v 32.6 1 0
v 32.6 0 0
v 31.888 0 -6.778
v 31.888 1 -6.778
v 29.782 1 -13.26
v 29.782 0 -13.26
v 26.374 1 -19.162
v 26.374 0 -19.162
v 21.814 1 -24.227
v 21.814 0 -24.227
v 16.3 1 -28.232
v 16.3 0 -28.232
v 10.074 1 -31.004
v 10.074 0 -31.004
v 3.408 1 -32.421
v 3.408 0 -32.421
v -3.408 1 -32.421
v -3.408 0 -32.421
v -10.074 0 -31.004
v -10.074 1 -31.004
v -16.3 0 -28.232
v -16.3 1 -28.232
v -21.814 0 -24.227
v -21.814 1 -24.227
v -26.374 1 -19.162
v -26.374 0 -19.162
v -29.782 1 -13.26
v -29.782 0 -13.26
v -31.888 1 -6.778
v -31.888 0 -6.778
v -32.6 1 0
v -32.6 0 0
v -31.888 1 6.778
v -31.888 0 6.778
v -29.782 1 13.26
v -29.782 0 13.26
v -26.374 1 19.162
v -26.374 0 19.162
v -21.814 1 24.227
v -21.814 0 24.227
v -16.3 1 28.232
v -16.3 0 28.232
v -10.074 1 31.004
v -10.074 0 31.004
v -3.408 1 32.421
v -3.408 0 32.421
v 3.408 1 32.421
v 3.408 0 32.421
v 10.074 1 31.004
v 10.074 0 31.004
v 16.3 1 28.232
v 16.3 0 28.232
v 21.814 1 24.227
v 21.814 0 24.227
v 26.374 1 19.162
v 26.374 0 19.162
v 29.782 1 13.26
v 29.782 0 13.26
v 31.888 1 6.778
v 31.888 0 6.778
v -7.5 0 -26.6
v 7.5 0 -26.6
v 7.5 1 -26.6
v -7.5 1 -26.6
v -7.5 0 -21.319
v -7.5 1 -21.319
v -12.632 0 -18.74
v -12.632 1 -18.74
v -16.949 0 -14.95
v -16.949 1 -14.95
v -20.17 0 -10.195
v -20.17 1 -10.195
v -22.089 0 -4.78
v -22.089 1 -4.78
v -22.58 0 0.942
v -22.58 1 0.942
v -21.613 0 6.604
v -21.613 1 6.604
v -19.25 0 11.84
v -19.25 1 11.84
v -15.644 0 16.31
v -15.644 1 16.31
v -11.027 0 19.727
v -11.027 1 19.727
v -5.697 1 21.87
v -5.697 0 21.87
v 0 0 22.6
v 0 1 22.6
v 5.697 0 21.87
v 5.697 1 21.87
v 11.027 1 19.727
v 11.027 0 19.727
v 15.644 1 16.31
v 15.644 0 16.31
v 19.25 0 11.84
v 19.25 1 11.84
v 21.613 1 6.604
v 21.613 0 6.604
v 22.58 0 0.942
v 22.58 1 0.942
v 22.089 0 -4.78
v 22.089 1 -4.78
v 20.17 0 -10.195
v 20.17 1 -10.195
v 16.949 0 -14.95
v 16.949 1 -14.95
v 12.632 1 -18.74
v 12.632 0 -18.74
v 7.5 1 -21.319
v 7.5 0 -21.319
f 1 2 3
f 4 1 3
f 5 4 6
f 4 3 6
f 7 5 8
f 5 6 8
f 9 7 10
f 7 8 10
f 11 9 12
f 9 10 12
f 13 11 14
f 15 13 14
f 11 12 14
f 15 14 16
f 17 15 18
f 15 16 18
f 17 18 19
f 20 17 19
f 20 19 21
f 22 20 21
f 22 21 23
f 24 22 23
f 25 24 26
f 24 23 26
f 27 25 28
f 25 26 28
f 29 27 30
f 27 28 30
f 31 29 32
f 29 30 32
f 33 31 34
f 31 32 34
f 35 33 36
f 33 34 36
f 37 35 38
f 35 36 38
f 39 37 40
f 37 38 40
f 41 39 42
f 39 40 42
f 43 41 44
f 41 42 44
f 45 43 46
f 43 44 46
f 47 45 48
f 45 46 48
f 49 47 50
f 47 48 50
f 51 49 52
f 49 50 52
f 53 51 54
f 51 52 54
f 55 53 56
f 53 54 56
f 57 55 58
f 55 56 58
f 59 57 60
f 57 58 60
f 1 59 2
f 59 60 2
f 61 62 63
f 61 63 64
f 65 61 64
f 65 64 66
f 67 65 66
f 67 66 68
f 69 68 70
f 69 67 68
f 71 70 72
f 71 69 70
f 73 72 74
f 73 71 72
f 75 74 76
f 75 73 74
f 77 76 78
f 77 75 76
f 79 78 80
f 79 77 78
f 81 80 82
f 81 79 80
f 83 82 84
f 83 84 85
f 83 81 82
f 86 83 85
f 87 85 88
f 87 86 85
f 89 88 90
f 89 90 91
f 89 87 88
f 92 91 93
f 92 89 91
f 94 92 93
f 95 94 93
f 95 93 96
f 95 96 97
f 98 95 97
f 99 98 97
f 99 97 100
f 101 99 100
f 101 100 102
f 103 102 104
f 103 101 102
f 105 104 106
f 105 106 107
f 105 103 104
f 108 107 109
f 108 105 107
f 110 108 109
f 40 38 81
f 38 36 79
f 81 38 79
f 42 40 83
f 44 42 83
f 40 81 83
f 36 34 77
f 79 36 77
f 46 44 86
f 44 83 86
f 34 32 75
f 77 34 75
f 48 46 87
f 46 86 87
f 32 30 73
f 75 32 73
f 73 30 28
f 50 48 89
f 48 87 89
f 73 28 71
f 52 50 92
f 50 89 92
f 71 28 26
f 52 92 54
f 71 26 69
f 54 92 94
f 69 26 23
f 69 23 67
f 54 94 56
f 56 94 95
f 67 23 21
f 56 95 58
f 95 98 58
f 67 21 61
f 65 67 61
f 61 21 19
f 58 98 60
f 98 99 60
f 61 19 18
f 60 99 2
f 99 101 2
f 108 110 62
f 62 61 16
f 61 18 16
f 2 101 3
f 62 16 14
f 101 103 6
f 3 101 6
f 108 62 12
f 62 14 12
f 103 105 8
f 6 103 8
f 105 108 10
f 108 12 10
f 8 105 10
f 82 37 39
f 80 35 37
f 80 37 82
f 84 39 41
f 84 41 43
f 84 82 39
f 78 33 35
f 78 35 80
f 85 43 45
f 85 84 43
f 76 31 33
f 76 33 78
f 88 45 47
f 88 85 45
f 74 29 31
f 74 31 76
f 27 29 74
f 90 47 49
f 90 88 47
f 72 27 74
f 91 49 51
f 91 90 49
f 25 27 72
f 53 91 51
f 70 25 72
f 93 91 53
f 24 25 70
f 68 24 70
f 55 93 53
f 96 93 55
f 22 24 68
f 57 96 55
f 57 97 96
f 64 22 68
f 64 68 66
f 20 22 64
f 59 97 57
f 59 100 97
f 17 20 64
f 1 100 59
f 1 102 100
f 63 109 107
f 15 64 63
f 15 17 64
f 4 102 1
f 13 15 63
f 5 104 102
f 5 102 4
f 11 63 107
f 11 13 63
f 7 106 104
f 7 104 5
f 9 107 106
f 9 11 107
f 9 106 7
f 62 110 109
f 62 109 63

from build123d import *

# Parameters (mm, degrees)
SKETCH1_R      = 32.6
EXTRUDE1_DEPTH = 1


with BuildPart() as part:
    # Sketch1 → Extrude1 (new body)
    with BuildSketch(Plane(origin=(0, 0, 0), x_dir=(1, 0, 0), z_dir=(0, 1, 0))):
        Circle(SKETCH1_R)
        with BuildLine():
            Line((-7.5, 26.6), (-7.5, 21.319240137))
            ThreePointArc((-7.5, 21.319240137), (0, -22.6), (7.5, 21.319240137))
            Line((7.5, 21.319240137), (7.5, 26.6))
            Line((7.5, 26.6), (-7.5, 26.6))
        make_face(mode=Mode.SUBTRACT)
    extrude(amount=EXTRUDE1_DEPTH)


solid = part.part
